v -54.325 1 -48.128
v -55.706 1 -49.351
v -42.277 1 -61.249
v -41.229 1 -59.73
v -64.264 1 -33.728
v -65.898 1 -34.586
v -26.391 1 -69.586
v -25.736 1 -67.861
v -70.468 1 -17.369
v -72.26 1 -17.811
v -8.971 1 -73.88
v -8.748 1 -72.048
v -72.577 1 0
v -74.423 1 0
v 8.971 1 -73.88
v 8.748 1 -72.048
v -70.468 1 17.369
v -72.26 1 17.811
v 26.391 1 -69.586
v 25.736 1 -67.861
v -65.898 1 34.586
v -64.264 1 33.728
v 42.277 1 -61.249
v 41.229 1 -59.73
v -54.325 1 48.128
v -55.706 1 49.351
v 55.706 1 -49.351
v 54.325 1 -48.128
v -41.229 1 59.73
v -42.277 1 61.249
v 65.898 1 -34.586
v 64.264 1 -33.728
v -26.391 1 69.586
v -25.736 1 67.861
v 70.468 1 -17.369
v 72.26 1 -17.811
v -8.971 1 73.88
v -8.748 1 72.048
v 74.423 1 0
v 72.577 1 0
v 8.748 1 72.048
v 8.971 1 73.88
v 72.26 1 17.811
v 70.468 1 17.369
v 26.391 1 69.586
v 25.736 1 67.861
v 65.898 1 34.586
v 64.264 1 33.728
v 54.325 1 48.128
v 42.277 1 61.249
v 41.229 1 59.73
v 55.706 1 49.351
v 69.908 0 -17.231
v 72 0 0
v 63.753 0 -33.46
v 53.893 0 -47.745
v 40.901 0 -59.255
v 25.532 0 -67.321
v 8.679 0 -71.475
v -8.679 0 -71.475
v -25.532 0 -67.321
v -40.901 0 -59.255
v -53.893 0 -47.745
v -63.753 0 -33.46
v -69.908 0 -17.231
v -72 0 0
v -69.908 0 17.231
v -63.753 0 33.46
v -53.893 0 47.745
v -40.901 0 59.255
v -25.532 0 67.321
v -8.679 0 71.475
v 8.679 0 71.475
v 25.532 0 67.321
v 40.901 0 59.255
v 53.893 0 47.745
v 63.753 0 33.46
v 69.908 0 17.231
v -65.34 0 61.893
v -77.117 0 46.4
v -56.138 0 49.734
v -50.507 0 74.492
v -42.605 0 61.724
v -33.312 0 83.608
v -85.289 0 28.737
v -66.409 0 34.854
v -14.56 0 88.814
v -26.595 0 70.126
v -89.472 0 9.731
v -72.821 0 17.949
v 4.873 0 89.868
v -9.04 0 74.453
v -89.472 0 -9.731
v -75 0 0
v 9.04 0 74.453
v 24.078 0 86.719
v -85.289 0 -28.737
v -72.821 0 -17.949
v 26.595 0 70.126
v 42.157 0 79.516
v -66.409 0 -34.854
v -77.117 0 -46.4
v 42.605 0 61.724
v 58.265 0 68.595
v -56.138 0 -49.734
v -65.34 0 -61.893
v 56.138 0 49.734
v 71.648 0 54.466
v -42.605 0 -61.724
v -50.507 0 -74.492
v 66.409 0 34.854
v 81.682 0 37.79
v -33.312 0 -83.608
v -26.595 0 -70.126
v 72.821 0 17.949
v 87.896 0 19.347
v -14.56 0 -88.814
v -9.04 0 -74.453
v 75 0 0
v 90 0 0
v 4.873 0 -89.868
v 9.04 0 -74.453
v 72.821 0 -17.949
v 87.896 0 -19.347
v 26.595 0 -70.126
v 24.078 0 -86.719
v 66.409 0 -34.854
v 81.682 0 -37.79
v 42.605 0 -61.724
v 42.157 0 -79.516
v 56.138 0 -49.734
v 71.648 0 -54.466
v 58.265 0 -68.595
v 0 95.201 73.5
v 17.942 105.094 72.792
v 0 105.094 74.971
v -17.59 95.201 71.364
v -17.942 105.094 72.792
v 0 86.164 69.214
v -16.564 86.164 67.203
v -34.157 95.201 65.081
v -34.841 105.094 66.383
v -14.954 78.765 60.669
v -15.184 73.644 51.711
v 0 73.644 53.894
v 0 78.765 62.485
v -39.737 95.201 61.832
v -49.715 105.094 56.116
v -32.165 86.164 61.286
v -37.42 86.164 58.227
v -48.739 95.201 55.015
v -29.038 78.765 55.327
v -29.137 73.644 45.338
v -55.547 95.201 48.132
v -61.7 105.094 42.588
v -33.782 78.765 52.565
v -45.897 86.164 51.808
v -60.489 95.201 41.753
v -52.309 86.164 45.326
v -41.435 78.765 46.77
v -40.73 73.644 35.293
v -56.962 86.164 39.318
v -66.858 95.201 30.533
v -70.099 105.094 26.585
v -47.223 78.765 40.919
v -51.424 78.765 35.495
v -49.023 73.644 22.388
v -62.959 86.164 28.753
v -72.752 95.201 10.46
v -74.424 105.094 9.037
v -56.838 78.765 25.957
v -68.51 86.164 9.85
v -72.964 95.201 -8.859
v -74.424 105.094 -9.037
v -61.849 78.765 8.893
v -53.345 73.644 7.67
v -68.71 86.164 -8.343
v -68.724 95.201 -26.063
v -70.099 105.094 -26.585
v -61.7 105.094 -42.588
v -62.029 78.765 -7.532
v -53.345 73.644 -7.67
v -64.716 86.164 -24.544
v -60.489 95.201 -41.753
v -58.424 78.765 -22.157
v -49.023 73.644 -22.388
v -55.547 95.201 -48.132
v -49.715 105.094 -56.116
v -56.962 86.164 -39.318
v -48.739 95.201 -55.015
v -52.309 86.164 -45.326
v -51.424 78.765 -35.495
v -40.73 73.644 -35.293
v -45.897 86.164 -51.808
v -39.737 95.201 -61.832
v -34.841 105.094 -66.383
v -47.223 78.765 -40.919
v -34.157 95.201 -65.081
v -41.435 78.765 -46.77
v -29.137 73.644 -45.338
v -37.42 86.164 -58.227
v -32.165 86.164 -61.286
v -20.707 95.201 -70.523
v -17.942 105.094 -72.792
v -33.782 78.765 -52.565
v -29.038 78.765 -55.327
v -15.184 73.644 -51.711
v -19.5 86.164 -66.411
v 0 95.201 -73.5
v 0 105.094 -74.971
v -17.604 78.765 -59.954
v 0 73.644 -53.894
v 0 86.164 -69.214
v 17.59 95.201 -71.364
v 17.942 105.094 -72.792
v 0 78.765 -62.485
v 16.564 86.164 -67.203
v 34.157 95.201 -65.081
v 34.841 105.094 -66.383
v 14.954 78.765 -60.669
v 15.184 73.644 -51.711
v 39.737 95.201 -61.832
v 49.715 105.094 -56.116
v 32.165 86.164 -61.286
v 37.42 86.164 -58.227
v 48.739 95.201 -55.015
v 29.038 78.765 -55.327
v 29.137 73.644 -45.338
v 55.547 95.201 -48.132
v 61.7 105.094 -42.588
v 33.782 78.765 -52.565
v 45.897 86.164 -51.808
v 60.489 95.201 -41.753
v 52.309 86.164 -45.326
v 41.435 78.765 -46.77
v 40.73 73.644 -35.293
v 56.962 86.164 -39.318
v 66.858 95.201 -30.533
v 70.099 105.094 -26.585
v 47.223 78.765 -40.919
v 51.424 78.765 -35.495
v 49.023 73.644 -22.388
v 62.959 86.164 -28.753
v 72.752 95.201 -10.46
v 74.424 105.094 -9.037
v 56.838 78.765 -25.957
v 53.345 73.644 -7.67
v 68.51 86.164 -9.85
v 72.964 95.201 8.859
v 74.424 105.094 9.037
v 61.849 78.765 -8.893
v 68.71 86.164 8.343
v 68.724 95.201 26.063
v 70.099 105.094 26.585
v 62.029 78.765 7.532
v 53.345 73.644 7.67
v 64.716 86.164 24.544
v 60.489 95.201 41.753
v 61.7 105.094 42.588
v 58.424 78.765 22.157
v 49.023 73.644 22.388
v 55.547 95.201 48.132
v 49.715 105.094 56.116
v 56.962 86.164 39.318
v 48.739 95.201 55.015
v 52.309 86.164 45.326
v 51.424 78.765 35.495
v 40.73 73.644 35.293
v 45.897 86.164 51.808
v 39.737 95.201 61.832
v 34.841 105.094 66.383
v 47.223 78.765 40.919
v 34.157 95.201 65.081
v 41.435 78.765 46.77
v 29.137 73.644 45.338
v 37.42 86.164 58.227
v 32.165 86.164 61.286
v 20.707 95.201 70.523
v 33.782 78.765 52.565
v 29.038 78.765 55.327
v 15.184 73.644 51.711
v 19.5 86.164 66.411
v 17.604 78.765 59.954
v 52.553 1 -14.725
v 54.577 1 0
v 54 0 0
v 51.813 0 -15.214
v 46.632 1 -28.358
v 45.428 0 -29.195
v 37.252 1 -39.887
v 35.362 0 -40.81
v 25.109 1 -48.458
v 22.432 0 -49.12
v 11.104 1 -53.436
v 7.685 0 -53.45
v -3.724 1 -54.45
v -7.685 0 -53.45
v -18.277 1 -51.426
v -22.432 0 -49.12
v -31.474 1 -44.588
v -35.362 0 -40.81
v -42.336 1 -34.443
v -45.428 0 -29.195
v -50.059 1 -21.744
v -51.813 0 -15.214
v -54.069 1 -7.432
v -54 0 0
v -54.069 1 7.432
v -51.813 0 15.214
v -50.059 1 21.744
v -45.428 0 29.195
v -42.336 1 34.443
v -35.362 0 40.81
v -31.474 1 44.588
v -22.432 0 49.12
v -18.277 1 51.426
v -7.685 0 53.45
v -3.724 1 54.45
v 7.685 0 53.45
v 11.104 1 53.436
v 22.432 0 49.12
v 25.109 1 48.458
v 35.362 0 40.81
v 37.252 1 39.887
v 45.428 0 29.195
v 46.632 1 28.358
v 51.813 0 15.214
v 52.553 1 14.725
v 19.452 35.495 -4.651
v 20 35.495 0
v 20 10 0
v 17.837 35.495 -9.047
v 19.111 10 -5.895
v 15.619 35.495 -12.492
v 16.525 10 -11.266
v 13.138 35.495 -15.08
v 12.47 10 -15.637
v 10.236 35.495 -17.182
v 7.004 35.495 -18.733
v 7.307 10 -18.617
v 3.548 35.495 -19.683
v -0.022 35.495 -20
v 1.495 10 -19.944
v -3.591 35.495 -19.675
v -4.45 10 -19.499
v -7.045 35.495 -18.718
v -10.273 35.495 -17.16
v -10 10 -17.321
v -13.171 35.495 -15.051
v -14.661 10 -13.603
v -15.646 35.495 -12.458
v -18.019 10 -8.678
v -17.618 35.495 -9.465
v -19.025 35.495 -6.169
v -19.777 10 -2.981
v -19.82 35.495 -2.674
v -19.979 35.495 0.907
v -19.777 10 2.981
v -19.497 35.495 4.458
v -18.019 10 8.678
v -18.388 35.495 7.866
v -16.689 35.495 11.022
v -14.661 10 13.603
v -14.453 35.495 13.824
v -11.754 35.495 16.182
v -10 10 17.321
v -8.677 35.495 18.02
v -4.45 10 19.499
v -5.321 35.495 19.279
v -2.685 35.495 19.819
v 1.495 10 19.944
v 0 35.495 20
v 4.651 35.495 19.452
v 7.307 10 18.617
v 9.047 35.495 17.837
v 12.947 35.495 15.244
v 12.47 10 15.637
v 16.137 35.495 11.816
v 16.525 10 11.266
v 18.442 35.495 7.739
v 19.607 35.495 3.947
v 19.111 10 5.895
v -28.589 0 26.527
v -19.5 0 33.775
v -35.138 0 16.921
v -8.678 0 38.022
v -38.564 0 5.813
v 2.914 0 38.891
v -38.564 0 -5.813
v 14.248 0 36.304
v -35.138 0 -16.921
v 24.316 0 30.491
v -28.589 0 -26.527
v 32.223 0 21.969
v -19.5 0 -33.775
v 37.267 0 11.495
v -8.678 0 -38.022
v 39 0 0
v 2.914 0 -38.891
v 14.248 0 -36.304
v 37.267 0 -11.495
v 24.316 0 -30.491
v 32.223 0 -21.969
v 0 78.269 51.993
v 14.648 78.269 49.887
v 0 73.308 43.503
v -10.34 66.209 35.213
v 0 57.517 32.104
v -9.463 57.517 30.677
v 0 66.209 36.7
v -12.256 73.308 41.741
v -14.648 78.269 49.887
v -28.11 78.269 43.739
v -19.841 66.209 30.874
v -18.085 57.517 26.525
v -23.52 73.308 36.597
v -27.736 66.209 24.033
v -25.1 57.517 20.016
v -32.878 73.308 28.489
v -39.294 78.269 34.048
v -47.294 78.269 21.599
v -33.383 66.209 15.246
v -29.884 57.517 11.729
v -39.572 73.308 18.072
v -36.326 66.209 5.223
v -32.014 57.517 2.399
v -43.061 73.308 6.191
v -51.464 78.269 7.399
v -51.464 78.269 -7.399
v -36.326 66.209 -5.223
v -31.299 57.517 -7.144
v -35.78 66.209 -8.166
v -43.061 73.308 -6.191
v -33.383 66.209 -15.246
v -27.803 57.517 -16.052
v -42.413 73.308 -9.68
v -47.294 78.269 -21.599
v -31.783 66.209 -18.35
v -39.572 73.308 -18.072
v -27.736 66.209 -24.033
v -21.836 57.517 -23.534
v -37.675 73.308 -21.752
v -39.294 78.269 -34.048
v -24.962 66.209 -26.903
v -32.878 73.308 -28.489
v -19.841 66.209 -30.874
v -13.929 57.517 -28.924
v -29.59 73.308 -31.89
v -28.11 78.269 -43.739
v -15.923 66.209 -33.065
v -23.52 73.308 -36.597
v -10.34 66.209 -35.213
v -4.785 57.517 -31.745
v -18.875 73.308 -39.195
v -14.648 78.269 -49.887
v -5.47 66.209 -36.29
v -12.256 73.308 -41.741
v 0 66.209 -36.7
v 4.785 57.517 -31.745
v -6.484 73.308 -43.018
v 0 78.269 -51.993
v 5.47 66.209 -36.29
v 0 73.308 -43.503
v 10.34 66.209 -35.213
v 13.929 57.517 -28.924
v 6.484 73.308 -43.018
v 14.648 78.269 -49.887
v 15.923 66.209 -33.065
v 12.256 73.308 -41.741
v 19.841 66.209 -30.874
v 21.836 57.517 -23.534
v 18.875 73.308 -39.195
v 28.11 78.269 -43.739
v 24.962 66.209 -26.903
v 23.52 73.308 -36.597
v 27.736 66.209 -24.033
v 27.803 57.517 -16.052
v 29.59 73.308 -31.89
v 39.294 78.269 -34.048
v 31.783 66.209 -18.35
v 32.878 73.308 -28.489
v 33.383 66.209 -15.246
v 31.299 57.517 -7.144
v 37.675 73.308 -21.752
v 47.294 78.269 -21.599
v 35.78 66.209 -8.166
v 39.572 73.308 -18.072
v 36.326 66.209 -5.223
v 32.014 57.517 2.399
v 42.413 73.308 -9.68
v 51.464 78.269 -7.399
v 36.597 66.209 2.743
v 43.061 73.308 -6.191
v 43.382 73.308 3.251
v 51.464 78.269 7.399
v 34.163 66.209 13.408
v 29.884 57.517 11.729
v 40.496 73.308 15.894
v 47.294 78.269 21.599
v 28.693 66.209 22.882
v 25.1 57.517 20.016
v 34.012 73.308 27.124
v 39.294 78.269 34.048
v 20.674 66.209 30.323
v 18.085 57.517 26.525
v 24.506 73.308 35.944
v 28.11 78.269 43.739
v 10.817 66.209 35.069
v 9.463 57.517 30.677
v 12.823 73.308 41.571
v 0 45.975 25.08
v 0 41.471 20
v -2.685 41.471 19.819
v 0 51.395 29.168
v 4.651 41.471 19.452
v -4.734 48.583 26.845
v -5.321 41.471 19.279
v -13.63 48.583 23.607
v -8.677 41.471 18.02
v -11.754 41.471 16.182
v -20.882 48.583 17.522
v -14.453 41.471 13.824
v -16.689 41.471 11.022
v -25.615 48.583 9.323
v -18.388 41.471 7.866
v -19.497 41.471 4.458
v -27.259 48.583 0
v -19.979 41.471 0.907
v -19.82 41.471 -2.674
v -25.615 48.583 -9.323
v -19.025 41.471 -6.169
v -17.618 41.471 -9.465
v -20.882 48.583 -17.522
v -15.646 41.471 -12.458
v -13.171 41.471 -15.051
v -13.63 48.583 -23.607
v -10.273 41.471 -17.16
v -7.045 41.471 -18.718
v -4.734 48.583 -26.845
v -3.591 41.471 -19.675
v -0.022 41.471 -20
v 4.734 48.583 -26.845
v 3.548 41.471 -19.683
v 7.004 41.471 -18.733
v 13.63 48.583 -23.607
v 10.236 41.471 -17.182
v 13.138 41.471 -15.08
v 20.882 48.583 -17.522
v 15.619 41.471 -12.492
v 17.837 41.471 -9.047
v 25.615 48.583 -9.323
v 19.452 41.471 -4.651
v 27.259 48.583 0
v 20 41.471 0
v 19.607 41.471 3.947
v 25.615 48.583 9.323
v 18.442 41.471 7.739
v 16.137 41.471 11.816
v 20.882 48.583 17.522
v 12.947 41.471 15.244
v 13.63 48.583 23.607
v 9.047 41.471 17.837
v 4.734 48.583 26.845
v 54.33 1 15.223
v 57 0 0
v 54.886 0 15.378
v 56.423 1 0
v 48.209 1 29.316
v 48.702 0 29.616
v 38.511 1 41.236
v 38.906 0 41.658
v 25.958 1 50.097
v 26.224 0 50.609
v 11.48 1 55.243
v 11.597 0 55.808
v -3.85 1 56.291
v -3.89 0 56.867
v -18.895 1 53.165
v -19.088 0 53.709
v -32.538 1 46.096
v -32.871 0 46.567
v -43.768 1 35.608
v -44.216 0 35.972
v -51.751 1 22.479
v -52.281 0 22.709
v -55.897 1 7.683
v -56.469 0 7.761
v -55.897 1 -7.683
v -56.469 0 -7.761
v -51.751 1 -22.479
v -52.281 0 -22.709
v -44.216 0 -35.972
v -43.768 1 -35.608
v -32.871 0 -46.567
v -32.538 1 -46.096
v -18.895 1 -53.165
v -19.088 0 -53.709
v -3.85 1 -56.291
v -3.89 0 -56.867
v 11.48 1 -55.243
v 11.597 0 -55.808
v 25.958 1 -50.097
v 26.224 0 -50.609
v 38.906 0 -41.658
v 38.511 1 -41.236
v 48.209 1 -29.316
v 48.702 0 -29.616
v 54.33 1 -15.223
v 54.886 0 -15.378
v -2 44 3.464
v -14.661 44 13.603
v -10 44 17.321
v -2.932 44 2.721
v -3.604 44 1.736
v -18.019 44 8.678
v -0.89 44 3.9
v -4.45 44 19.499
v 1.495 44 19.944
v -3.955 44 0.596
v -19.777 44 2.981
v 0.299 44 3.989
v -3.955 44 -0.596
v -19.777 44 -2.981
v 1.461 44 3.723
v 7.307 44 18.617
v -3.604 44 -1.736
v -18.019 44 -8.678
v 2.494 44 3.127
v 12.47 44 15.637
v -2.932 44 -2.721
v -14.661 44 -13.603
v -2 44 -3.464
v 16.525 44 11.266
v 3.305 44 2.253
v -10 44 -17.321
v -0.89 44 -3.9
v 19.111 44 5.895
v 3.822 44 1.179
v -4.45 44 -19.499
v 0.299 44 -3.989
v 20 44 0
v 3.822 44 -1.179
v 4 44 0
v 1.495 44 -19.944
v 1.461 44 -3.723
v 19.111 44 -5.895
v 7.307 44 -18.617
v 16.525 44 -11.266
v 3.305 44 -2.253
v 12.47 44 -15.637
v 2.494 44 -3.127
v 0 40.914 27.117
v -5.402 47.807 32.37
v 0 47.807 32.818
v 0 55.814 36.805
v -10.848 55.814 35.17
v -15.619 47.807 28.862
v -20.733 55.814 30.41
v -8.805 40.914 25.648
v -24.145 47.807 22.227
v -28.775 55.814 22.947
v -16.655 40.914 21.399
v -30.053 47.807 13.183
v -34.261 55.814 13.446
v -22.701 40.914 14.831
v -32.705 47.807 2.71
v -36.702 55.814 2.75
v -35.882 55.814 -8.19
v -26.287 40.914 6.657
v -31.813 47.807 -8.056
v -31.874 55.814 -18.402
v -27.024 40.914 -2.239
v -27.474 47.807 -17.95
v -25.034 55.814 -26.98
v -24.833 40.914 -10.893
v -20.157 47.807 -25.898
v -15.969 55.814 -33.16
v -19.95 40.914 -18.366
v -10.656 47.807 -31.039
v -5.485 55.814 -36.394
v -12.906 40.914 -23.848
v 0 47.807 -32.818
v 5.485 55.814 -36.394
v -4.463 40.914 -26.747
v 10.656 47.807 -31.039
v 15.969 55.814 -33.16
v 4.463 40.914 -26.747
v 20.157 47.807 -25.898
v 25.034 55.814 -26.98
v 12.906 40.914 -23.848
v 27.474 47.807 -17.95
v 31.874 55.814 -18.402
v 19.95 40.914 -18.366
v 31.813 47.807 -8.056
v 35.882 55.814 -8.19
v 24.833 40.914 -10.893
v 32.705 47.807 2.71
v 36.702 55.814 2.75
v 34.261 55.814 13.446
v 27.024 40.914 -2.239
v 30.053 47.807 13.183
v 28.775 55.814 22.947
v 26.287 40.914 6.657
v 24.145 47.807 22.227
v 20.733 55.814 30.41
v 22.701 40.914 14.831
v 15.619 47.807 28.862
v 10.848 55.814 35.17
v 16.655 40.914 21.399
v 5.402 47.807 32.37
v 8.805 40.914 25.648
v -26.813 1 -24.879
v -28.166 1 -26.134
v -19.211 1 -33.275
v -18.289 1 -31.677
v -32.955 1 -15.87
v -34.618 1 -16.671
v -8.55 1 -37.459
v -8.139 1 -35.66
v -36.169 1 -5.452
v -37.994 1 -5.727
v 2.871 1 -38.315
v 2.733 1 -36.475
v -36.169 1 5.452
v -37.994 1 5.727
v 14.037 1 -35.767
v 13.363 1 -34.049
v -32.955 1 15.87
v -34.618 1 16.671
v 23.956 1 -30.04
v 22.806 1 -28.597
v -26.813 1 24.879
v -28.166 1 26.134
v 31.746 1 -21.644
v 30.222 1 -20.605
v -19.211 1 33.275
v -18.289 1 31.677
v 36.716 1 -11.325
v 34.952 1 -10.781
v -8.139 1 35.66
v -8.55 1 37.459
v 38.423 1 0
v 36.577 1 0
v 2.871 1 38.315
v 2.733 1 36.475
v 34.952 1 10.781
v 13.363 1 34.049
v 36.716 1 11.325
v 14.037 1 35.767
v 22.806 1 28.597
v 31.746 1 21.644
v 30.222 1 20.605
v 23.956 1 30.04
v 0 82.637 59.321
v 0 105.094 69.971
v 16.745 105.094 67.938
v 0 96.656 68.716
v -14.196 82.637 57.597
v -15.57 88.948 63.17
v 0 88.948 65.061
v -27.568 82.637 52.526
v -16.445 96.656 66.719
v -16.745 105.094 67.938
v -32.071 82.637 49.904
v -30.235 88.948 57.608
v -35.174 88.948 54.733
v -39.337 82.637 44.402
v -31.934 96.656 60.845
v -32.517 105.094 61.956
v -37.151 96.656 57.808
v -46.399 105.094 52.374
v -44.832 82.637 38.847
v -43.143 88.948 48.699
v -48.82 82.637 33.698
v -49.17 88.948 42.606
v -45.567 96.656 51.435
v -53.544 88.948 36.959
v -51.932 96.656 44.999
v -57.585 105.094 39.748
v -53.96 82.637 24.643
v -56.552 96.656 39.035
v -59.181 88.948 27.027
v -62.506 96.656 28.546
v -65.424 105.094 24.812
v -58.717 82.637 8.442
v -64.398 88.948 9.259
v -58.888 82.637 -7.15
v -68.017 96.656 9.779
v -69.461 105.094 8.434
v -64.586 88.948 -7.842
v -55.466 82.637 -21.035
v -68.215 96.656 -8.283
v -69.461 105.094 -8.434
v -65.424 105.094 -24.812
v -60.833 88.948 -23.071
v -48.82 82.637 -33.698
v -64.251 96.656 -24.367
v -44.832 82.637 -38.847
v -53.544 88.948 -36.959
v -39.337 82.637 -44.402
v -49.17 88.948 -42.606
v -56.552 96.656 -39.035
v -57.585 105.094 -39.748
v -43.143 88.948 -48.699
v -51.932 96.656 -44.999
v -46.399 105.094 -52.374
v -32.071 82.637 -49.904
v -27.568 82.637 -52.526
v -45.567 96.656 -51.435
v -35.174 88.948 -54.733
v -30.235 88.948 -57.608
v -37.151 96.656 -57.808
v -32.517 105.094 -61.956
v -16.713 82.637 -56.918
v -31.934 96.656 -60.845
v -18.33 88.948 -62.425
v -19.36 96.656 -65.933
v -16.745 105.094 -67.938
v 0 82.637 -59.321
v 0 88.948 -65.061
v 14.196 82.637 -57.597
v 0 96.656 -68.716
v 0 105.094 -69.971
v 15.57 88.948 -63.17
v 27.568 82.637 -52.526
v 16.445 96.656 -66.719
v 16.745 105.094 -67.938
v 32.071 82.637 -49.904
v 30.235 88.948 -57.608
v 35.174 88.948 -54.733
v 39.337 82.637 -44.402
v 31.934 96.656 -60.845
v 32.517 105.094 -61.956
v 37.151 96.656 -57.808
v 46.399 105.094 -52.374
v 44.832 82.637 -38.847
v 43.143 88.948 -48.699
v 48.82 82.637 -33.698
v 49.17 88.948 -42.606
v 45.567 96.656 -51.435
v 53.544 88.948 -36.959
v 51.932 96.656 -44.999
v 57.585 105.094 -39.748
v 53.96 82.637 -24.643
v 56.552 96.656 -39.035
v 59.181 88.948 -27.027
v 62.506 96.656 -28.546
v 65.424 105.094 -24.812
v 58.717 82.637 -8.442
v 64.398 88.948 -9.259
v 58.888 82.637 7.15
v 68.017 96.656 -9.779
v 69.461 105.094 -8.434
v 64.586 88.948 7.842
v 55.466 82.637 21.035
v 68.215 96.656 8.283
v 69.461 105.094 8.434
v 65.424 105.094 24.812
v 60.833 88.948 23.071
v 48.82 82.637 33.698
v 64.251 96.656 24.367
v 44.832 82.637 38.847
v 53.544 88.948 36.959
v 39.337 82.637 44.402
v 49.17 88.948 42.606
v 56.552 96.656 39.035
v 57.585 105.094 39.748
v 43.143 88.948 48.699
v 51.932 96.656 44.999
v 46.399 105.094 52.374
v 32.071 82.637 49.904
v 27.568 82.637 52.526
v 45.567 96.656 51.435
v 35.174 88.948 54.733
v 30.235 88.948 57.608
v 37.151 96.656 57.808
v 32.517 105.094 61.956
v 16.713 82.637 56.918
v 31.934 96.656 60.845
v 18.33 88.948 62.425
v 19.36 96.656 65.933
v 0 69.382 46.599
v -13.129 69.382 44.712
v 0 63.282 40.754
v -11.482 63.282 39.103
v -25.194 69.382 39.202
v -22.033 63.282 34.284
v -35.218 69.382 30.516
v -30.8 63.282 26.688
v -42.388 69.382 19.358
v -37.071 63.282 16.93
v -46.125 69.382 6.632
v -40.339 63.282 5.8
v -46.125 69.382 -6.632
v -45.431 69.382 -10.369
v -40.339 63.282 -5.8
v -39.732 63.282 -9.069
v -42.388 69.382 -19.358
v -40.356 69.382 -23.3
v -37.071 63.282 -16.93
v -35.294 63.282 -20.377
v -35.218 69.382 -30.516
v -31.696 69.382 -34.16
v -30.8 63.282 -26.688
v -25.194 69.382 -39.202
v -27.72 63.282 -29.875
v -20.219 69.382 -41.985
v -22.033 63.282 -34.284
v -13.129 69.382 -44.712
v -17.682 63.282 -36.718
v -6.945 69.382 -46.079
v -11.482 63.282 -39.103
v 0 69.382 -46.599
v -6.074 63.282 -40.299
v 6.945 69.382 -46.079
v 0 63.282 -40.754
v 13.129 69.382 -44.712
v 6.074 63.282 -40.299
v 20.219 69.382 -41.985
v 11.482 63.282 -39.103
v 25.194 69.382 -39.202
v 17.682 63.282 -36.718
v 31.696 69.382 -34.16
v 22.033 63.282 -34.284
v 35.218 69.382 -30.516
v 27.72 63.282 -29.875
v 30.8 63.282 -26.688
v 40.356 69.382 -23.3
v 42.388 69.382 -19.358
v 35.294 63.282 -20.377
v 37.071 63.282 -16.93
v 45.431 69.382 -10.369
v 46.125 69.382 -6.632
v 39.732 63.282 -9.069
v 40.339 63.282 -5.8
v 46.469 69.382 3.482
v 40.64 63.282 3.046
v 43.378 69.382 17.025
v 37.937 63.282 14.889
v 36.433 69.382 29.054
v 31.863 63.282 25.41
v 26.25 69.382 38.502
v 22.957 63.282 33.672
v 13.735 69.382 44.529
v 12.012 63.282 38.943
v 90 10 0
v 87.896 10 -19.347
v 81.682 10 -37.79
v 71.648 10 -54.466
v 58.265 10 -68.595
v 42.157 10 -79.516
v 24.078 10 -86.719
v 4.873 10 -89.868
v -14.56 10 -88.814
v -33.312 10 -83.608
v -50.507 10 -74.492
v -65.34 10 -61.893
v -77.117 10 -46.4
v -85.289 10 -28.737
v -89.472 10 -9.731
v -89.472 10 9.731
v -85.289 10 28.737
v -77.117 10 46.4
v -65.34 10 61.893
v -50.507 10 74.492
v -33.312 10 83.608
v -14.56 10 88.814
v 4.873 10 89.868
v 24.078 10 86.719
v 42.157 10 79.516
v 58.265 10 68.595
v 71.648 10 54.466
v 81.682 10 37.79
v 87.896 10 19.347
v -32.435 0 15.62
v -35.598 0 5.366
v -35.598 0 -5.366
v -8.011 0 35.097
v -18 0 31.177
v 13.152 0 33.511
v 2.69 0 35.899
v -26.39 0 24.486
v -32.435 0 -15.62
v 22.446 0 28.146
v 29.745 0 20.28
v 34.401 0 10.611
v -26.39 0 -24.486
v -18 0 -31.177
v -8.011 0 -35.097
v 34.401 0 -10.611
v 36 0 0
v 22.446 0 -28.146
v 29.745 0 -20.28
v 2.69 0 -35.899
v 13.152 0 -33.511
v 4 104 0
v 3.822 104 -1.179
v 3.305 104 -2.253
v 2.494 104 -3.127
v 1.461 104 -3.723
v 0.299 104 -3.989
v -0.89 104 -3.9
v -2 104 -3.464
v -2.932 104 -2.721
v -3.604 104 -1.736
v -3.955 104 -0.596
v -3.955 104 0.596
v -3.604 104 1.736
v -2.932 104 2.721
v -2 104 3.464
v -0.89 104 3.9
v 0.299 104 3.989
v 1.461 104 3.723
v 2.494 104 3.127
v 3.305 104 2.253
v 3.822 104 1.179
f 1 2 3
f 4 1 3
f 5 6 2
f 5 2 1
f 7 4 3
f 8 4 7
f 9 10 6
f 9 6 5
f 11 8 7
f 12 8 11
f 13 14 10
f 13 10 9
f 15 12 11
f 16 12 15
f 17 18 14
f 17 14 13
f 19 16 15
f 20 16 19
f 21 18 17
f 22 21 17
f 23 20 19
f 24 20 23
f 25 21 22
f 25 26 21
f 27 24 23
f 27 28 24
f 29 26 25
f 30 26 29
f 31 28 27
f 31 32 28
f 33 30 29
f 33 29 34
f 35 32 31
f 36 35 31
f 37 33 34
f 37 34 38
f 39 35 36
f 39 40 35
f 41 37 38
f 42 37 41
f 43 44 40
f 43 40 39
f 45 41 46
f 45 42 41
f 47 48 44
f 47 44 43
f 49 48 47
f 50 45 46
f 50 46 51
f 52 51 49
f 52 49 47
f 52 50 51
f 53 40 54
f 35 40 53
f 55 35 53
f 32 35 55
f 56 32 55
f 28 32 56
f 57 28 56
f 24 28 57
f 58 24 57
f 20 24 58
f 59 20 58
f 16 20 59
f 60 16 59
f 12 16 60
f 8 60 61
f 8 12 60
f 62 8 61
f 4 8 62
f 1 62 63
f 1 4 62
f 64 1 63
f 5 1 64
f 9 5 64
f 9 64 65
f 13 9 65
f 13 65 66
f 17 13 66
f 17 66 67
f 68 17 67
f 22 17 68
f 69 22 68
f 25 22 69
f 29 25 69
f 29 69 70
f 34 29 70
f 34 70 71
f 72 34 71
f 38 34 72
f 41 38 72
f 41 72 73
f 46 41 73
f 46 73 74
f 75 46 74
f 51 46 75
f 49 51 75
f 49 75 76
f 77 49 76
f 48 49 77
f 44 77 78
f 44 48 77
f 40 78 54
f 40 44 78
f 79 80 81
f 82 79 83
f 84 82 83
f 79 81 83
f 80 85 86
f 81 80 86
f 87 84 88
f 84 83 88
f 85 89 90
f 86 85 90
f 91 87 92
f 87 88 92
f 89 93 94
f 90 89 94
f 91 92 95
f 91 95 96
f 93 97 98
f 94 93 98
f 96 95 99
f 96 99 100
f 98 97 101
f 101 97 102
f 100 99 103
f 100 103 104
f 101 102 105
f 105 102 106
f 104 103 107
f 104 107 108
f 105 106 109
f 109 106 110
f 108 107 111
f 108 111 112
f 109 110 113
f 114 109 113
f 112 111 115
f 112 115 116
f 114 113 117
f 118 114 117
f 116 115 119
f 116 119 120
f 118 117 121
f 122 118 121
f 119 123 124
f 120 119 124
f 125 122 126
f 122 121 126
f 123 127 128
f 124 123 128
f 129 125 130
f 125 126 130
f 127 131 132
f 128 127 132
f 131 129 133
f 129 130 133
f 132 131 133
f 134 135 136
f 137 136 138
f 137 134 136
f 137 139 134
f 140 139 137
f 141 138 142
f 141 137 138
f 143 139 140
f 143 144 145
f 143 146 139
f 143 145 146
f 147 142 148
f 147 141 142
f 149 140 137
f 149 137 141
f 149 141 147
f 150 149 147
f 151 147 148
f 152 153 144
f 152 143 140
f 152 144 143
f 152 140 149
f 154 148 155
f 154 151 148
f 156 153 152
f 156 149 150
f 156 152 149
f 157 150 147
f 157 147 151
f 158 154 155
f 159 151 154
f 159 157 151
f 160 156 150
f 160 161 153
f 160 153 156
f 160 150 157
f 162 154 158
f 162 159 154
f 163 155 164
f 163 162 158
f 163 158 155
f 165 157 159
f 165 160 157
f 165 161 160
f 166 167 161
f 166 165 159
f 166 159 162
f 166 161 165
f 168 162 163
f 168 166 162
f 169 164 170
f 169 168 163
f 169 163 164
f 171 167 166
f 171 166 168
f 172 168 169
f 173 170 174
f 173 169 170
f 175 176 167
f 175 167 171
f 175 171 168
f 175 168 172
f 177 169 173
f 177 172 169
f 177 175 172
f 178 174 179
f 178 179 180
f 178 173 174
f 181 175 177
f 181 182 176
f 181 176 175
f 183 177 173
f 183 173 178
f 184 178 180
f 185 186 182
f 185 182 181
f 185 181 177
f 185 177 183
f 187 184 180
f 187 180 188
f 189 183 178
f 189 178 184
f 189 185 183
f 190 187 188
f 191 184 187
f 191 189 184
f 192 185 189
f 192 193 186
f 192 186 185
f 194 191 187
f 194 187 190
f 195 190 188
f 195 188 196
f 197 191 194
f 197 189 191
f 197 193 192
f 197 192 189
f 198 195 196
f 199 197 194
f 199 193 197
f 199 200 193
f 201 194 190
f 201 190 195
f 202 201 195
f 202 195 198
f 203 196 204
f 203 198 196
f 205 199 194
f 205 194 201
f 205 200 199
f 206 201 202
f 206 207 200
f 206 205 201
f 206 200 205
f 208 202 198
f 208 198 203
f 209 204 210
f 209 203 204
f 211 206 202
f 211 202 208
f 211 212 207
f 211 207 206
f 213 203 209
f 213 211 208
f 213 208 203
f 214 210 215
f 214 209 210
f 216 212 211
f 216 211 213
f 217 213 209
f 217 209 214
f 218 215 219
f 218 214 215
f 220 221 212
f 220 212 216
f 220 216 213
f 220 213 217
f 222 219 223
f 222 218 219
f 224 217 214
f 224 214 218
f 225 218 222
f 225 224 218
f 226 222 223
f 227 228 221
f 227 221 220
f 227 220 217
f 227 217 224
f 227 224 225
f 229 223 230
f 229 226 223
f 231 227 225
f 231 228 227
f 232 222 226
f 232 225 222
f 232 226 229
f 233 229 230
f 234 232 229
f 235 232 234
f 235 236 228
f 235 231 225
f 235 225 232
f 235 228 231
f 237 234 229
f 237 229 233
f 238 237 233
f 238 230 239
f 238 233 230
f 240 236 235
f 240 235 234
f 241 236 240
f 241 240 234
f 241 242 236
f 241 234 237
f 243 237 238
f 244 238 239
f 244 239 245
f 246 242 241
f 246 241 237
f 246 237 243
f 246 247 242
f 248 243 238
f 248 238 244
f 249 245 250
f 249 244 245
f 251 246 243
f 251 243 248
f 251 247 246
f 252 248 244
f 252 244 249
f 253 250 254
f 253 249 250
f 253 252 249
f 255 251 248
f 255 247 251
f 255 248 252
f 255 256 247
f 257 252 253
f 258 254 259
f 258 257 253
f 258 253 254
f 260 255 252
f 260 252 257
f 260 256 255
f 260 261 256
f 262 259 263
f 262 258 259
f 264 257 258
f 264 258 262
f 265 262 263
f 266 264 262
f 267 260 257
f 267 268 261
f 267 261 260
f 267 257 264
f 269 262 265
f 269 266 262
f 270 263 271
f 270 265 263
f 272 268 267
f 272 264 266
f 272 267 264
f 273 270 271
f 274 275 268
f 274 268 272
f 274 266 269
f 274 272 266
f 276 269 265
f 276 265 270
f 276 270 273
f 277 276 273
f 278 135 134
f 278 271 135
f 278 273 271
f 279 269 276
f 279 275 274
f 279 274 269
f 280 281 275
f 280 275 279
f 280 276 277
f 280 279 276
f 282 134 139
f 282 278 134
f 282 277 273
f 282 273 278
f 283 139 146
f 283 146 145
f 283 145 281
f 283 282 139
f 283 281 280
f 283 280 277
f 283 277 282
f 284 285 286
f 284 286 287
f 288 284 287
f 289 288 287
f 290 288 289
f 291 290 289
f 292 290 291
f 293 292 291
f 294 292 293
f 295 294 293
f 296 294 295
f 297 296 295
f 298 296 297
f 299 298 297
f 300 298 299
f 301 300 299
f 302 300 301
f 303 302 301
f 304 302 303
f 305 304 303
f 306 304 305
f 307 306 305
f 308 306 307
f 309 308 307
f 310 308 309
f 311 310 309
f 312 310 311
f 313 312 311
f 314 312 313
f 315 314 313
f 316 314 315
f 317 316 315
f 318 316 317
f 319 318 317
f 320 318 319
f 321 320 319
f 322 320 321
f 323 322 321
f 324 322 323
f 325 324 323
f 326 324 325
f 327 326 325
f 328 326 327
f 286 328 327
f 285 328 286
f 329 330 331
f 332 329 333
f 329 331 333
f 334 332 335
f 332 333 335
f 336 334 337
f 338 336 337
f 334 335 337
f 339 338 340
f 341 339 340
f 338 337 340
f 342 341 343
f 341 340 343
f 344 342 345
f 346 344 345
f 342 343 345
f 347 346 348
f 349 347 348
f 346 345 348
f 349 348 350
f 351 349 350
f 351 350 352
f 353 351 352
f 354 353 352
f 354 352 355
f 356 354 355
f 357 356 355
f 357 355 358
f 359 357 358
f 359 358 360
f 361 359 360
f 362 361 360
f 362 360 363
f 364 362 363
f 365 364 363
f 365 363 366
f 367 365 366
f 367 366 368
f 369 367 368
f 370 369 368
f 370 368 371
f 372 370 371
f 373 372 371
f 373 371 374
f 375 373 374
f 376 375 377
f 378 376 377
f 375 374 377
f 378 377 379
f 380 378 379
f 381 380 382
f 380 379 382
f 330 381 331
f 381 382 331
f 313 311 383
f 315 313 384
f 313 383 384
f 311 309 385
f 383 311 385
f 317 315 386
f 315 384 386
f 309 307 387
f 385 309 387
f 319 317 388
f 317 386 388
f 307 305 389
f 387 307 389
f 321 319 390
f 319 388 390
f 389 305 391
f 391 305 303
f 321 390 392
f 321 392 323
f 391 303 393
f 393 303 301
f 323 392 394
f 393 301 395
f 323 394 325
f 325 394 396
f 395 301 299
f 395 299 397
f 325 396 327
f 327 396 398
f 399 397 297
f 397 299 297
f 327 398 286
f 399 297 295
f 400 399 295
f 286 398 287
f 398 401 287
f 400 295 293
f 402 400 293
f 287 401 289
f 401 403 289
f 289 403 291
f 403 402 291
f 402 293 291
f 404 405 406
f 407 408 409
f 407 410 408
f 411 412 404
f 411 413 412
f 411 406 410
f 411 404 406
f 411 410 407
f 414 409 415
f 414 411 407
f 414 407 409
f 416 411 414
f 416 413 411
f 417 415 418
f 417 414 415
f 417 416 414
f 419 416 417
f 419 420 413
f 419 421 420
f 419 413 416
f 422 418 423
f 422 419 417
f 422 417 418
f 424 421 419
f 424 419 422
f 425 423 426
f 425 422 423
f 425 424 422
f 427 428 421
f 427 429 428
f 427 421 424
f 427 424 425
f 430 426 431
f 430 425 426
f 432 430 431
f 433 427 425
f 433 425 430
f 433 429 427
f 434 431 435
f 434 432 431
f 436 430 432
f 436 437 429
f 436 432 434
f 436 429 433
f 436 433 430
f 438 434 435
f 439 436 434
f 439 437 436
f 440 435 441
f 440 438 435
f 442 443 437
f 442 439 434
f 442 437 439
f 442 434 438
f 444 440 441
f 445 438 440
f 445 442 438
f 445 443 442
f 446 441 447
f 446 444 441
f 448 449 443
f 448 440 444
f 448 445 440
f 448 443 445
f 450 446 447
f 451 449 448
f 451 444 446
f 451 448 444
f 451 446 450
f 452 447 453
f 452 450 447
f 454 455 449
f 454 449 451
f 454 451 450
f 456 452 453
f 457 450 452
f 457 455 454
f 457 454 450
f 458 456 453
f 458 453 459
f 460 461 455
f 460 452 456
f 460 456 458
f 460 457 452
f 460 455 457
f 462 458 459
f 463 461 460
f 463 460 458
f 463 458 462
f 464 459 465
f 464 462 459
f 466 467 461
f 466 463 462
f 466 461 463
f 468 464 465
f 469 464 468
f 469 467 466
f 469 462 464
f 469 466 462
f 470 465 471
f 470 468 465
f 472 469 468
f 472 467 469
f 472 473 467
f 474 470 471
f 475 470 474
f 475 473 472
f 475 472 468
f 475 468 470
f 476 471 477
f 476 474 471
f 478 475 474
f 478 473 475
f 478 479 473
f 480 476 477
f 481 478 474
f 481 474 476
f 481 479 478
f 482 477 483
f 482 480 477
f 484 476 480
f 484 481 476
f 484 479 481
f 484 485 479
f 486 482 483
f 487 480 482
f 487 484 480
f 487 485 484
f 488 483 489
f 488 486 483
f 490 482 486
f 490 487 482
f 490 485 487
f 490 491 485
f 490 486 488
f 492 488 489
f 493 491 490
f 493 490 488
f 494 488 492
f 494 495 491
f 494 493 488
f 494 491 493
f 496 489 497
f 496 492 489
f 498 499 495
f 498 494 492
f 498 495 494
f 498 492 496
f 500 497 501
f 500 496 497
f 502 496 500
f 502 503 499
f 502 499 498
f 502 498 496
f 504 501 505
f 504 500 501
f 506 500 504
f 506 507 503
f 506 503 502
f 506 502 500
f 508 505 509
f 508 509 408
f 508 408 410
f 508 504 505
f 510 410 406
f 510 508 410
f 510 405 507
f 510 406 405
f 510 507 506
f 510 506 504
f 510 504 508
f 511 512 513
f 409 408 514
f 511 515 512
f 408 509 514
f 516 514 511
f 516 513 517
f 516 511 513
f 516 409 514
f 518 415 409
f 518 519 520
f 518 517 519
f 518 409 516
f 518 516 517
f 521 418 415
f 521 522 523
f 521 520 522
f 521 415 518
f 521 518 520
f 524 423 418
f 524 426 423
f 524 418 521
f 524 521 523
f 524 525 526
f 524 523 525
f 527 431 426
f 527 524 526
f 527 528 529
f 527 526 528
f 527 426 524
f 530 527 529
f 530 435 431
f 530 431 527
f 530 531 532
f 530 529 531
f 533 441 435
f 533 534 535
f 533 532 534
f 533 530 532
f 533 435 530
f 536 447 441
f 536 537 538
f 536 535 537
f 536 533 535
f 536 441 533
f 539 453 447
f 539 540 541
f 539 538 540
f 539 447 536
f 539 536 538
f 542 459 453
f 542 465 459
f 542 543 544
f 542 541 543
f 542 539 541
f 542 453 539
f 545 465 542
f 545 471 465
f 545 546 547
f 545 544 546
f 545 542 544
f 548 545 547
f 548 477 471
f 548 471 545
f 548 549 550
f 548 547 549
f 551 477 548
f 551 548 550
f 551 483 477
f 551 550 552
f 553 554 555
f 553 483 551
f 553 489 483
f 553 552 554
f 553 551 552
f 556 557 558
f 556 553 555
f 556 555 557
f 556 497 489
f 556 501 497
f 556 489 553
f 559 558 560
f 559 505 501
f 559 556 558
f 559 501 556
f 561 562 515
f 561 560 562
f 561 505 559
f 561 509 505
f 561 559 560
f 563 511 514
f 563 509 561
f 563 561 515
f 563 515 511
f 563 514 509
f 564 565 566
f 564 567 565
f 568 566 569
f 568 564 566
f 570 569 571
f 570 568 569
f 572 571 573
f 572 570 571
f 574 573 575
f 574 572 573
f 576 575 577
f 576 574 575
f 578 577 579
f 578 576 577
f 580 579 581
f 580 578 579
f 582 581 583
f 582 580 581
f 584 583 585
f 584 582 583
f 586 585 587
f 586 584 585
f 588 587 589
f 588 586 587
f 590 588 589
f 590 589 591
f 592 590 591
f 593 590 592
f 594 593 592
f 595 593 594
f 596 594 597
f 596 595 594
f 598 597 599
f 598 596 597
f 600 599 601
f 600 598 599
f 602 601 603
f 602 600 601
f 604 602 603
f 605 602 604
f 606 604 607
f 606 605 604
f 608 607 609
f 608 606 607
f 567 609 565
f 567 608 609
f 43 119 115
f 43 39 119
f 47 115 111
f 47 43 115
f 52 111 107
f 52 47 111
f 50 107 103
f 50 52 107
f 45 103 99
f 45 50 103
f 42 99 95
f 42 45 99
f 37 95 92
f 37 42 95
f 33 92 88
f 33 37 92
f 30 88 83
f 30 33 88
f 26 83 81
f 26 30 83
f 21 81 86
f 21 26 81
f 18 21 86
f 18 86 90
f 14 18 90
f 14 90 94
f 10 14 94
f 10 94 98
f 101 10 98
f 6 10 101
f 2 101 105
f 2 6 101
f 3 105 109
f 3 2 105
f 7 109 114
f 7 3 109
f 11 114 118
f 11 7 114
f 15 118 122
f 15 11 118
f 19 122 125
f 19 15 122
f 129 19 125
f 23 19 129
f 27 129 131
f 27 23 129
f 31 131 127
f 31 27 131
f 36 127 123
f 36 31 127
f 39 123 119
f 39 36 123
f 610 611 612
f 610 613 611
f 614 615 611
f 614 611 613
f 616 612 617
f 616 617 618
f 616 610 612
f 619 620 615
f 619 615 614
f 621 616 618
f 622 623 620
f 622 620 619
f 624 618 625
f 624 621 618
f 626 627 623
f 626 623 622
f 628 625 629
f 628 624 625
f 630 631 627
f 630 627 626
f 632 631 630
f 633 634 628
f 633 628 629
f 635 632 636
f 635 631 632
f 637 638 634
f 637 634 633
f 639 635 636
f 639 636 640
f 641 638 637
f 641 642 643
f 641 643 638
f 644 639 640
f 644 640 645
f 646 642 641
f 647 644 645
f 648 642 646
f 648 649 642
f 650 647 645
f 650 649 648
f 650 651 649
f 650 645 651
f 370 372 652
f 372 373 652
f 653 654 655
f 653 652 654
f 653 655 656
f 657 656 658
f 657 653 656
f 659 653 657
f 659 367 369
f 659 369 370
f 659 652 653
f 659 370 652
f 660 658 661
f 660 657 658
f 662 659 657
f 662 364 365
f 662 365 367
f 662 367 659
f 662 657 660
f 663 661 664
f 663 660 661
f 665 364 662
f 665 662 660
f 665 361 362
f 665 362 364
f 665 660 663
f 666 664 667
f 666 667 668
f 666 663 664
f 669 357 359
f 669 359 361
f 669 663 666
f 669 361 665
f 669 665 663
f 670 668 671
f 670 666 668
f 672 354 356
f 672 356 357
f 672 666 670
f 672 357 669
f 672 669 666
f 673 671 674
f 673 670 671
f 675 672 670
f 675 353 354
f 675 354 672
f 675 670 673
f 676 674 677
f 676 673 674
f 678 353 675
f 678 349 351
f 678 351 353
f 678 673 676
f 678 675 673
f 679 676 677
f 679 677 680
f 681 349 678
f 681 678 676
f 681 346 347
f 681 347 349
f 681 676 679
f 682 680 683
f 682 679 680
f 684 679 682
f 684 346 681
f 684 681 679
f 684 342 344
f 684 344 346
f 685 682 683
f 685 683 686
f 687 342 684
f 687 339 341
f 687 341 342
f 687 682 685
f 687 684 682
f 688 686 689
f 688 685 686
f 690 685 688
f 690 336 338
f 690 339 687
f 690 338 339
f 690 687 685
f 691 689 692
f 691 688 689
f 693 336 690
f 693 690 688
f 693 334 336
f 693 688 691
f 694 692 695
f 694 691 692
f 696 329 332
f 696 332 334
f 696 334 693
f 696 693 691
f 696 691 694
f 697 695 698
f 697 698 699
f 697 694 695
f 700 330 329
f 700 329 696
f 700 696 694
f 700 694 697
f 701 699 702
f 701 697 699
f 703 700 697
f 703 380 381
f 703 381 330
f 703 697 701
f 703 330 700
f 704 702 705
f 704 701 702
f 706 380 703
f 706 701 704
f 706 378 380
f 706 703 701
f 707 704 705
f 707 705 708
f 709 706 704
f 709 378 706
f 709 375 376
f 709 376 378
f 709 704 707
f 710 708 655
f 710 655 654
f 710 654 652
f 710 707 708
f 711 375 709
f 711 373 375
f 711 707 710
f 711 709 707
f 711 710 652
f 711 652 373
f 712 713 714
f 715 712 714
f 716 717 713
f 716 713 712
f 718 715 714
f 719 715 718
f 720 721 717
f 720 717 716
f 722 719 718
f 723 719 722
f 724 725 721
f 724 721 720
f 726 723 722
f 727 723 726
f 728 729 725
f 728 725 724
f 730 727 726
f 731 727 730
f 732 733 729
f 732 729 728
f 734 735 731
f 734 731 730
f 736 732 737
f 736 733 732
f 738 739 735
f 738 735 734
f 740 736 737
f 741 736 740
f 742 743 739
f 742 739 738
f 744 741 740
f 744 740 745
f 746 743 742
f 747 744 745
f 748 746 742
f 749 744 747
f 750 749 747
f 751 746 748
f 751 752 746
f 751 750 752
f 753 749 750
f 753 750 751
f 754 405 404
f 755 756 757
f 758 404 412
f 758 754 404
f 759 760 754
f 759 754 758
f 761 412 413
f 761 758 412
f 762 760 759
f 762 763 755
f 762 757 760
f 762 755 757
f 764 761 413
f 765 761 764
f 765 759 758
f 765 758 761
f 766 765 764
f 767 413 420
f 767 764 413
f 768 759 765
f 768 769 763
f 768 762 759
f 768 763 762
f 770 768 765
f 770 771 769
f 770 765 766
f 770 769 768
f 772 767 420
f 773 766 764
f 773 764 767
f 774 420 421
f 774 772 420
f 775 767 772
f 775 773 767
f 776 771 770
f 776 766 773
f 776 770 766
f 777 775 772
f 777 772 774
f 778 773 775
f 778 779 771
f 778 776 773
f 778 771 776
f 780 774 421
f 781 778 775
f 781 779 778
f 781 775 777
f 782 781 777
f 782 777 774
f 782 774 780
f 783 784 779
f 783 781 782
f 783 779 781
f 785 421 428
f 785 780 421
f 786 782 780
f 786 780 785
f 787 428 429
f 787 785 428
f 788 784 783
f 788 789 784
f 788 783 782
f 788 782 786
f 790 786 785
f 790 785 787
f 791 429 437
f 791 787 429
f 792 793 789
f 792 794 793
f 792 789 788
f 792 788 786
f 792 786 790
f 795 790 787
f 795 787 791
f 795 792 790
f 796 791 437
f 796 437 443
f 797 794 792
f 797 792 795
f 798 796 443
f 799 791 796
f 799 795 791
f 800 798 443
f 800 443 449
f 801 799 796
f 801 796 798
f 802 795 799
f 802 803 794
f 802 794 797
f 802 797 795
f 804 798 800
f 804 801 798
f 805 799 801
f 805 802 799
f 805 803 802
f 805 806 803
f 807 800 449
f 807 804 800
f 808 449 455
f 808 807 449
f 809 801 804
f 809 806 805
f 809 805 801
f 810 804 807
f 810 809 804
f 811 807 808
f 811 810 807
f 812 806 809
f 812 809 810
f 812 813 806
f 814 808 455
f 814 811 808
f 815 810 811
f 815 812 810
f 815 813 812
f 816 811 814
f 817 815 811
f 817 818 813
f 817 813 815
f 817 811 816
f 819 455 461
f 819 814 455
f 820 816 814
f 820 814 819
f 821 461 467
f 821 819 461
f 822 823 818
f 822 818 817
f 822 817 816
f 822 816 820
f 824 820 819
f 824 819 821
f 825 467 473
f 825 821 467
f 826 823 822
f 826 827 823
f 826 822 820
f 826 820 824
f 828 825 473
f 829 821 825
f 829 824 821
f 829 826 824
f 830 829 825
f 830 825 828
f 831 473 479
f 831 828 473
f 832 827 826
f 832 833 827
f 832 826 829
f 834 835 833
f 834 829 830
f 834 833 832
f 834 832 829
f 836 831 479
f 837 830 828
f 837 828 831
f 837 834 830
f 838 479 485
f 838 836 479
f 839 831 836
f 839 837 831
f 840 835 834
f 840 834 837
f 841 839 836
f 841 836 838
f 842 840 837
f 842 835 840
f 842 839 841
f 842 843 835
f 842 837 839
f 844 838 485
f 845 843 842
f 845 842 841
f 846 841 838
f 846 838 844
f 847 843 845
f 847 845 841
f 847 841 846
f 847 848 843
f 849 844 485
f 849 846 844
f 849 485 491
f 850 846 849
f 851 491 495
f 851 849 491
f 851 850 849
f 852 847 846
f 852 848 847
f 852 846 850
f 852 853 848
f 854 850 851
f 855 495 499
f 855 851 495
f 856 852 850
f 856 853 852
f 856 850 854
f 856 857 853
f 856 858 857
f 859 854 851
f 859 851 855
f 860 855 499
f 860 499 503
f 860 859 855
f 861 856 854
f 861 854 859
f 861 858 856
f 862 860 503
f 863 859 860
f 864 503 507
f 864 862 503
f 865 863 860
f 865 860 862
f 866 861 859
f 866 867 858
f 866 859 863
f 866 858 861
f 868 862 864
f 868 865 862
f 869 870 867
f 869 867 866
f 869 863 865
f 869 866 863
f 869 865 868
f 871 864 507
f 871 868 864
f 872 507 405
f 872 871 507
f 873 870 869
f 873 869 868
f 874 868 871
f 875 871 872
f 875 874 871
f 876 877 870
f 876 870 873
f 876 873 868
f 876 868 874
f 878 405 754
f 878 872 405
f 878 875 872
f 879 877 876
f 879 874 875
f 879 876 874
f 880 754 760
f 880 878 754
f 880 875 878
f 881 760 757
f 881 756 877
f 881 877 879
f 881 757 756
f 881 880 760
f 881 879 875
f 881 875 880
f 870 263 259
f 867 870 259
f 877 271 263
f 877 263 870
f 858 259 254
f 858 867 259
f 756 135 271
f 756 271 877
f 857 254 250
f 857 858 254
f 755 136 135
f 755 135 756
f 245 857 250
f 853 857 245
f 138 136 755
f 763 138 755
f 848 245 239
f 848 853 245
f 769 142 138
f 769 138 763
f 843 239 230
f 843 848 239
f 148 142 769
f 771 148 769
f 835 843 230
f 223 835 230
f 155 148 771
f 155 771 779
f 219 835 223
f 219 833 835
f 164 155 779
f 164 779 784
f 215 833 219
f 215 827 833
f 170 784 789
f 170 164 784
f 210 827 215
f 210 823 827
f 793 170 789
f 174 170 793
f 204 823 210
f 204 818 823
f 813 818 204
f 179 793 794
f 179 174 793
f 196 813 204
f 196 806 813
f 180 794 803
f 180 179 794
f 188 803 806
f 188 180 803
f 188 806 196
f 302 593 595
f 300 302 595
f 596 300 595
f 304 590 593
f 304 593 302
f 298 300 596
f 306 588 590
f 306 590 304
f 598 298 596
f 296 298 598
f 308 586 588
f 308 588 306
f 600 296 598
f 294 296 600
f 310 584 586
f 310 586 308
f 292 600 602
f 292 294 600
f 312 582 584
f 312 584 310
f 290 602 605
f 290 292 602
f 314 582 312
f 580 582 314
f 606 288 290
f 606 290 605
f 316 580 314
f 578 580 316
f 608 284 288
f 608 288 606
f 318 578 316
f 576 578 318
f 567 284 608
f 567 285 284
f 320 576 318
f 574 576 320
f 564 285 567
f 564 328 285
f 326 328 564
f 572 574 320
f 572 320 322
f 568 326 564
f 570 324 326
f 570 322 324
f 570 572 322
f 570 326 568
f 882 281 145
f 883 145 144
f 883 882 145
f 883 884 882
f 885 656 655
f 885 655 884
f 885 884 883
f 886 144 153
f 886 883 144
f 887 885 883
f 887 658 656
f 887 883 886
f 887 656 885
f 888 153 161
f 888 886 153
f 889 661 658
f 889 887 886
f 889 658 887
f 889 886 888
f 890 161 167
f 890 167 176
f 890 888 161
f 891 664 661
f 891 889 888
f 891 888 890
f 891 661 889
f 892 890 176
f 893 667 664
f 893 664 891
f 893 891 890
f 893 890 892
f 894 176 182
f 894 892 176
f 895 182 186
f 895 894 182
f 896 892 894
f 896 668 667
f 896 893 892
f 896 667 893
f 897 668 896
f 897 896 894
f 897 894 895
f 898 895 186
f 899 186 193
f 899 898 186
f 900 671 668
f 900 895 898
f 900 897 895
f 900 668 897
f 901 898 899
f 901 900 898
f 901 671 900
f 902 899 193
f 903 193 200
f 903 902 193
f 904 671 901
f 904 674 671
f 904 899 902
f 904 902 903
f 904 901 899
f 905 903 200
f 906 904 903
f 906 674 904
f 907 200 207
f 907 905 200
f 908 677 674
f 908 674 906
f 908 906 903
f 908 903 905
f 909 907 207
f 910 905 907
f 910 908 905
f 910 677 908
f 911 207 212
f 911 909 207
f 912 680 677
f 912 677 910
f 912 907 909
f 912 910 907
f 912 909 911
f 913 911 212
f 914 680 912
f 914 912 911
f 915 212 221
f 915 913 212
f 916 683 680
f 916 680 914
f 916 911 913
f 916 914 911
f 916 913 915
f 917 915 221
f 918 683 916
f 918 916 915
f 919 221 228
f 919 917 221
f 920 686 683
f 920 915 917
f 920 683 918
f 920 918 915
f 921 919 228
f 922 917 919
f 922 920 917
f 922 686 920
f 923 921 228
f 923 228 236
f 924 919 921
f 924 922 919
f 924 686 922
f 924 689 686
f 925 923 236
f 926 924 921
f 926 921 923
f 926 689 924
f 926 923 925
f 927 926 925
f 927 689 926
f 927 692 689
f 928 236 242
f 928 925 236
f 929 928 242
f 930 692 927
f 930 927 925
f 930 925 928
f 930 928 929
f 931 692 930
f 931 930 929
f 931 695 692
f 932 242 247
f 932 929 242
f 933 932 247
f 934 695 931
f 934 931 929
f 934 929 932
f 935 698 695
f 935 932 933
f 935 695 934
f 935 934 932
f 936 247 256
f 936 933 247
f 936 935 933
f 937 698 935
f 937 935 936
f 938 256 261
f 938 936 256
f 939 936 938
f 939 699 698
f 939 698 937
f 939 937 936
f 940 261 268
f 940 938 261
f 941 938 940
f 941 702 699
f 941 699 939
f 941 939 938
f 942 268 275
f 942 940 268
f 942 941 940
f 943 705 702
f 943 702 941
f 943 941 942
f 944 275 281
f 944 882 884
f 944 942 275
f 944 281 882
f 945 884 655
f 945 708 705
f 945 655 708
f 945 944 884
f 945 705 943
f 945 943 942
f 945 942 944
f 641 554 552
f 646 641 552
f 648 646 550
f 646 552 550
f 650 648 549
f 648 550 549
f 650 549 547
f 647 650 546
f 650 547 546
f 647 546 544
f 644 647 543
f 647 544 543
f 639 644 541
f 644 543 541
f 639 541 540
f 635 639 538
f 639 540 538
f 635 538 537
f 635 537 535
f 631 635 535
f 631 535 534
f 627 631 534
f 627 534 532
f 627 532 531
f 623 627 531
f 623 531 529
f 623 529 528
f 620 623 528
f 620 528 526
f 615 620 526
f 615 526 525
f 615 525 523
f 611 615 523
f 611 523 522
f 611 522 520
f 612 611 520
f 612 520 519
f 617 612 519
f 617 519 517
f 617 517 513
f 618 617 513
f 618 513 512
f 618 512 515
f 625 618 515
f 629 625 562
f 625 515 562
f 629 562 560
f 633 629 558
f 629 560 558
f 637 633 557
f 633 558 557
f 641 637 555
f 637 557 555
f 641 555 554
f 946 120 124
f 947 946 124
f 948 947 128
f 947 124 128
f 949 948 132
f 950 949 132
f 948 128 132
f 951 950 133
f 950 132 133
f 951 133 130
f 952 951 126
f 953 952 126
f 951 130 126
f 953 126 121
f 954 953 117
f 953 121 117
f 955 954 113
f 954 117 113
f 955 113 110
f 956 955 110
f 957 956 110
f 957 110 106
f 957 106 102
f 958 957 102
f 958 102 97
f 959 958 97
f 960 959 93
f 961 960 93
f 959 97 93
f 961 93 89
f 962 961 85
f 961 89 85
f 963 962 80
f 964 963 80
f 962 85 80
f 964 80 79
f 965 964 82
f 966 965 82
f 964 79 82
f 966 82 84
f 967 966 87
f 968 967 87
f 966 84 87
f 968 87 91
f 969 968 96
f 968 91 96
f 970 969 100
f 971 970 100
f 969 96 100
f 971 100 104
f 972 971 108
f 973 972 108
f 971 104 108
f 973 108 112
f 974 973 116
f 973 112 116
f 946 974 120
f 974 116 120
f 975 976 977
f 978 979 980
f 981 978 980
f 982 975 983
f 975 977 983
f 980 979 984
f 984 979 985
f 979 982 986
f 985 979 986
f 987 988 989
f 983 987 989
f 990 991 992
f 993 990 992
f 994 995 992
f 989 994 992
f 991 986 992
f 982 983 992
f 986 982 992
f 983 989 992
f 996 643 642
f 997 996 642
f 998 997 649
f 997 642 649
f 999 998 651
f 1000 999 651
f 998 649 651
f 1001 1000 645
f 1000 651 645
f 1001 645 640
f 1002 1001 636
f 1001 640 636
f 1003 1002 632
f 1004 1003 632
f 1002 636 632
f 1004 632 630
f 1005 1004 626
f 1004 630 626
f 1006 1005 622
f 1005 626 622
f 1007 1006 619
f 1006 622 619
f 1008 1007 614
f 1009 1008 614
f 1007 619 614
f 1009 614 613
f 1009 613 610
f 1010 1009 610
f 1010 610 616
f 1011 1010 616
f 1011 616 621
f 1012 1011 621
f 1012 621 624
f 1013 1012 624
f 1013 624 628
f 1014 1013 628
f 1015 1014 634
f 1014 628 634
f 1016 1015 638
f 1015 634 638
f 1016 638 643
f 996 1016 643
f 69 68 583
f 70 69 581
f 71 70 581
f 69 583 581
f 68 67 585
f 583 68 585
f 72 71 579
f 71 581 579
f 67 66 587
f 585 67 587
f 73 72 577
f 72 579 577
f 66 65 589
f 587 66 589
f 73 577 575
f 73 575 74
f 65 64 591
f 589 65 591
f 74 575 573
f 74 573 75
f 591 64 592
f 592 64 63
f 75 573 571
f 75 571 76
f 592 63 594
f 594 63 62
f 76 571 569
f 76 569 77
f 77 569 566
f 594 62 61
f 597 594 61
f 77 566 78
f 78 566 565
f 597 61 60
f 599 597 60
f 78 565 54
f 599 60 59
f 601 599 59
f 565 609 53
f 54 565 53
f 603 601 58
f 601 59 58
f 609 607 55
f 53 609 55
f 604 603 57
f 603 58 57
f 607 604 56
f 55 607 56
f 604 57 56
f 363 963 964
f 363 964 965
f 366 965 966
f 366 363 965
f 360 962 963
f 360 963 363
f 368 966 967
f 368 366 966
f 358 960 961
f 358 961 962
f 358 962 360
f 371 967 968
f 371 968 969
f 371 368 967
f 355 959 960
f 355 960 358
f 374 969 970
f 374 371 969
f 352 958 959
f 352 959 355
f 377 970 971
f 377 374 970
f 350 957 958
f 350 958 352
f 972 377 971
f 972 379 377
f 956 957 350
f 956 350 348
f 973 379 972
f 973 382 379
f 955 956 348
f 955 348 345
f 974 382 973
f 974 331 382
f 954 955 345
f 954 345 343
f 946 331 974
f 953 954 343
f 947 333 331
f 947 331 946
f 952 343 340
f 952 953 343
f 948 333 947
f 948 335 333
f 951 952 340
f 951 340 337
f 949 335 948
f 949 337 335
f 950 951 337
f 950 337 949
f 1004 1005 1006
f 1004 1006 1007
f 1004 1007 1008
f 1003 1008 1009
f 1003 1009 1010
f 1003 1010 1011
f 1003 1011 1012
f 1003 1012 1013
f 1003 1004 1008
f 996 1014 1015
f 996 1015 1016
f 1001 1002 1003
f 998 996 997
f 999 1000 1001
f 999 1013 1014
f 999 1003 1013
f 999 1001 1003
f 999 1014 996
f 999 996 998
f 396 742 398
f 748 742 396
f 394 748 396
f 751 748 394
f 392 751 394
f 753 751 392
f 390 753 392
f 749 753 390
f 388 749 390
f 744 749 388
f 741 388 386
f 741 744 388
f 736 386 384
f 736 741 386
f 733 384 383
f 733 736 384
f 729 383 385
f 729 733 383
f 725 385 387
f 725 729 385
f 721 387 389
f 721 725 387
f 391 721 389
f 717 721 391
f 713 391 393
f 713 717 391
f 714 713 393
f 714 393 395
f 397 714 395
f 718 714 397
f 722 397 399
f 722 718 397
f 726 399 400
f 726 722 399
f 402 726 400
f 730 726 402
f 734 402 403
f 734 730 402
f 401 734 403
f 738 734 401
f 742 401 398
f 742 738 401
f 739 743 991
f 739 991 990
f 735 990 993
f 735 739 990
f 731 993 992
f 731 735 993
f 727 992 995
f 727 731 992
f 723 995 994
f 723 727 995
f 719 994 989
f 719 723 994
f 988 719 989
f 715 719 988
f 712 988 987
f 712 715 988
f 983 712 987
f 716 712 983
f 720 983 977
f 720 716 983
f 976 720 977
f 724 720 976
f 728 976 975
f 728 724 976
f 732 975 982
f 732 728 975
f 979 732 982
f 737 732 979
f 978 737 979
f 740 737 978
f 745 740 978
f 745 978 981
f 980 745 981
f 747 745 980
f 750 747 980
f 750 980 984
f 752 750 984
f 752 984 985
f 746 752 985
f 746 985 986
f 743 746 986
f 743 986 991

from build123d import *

# Parameters (mm, degrees)
ESQUISSE1_R             = 90
BOSS_EXTRU_1_DEPTH      = 10
ESQUISSE2_R             = 20
BOSS_EXTRU_2_DEPTH      = 93
ESQUISSE4_R             = 75
ESQUISSE4_R_2           = 72
ESQUISSE4_R_3           = 57
ESQUISSE4_R_4           = 54
ESQUISSE4_R_5           = 39
ESQUISSE4_R_6           = 36
ENL_V_MAT_EXTRU_1_DEPTH = 1
ENL_V_MAT_EXTRU_1_TAPER = 30
ESQUISSE5_R             = 20
ENL_V_MAT_EXTRU_2_DEPTH = 59
ESQUISSE6_R             = 4
BOSS_EXTRU_3_DEPTH      = 60


with BuildPart() as part:
    # Esquisse1 → Boss.-Extru.1 (new body)
    with BuildSketch(Plane(origin=(0, 0, 0), x_dir=(1, 0, 0), z_dir=(0, 1, 0))):
        Circle(ESQUISSE1_R)
    extrude(amount=BOSS_EXTRU_1_DEPTH)

    # Esquisse2 → Boss.-Extru.2 (add)
    with BuildSketch(Plane(origin=(0, 10, 0), x_dir=(1, 0, 0), z_dir=(0, 1, 0))):
        Circle(ESQUISSE2_R)
    extrude(amount=BOSS_EXTRU_2_DEPTH)

    # Esquisse4 → Enlèv. mat.-Extru.1 (cut)
    with BuildSketch(Plane.XZ):
        Circle(ESQUISSE4_R)
        Circle(ESQUISSE4_R_2, mode=Mode.SUBTRACT)
        Circle(ESQUISSE4_R_3)
        Circle(ESQUISSE4_R_4, mode=Mode.SUBTRACT)
        Circle(ESQUISSE4_R_5)
        Circle(ESQUISSE4_R_6, mode=Mode.SUBTRACT)
    extrude(amount=-ENL_V_MAT_EXTRU_1_DEPTH, taper=ENL_V_MAT_EXTRU_1_TAPER, mode=Mode.SUBTRACT)

    # Esquisse3 → Révolution2 (revolve)
    with BuildSketch(Plane(origin=(0, 0, 0), x_dir=(0, 0, -1), z_dir=(1, 0, 0))):
        with BuildLine():
            Line((-69.970754953, 105.094254483), (-74.970754953, 105.094254483))
            ThreePointArc((-74.970754953, 105.094254483), (-69.214189796, 86.164390325), (-53.893634743, 73.644071148))
            ThreePointArc((-53.893634743, 73.644071148), (-43.46448587, 66.535394214), (-36.80473888, 55.814004192))
            ThreePointArc((-36.80473888, 55.814004192), (-22.477497728, 37.096821257), (0, 30))
            Line((0, 30), (0, 35))
            ThreePointArc((0, 35), (-19.606403656, 41.190330611), (-32.103598704, 57.516731724))
            ThreePointArc((-32.103598704, 57.516731724), (-39.854721671, 69.995105534), (-51.992962878, 78.26872751))
            ThreePointArc((-51.992962878, 78.26872751), (-65.060675662, 88.947970814), (-69.970754953, 105.094254483))
        make_face()
    revolve(axis=Axis((0, 103, 0), (0, -1, 0)))

    # Esquisse5 → Enlèv. mat.-Extru.2 (cut)
    with BuildSketch(Plane(origin=(0, 103, 0), x_dir=(1, 0, 0), z_dir=(0, 1, 0))):
        Circle(ESQUISSE5_R)
    extrude(amount=-ENL_V_MAT_EXTRU_2_DEPTH, mode=Mode.SUBTRACT)

    # Esquisse6 → Boss.-Extru.3 (add)
    with BuildSketch(Plane(origin=(0, 44, 0), x_dir=(1, 0, 0), z_dir=(0, 1, 0))):
        Circle(ESQUISSE6_R)
    extrude(amount=BOSS_EXTRU_3_DEPTH)


solid = part.part
